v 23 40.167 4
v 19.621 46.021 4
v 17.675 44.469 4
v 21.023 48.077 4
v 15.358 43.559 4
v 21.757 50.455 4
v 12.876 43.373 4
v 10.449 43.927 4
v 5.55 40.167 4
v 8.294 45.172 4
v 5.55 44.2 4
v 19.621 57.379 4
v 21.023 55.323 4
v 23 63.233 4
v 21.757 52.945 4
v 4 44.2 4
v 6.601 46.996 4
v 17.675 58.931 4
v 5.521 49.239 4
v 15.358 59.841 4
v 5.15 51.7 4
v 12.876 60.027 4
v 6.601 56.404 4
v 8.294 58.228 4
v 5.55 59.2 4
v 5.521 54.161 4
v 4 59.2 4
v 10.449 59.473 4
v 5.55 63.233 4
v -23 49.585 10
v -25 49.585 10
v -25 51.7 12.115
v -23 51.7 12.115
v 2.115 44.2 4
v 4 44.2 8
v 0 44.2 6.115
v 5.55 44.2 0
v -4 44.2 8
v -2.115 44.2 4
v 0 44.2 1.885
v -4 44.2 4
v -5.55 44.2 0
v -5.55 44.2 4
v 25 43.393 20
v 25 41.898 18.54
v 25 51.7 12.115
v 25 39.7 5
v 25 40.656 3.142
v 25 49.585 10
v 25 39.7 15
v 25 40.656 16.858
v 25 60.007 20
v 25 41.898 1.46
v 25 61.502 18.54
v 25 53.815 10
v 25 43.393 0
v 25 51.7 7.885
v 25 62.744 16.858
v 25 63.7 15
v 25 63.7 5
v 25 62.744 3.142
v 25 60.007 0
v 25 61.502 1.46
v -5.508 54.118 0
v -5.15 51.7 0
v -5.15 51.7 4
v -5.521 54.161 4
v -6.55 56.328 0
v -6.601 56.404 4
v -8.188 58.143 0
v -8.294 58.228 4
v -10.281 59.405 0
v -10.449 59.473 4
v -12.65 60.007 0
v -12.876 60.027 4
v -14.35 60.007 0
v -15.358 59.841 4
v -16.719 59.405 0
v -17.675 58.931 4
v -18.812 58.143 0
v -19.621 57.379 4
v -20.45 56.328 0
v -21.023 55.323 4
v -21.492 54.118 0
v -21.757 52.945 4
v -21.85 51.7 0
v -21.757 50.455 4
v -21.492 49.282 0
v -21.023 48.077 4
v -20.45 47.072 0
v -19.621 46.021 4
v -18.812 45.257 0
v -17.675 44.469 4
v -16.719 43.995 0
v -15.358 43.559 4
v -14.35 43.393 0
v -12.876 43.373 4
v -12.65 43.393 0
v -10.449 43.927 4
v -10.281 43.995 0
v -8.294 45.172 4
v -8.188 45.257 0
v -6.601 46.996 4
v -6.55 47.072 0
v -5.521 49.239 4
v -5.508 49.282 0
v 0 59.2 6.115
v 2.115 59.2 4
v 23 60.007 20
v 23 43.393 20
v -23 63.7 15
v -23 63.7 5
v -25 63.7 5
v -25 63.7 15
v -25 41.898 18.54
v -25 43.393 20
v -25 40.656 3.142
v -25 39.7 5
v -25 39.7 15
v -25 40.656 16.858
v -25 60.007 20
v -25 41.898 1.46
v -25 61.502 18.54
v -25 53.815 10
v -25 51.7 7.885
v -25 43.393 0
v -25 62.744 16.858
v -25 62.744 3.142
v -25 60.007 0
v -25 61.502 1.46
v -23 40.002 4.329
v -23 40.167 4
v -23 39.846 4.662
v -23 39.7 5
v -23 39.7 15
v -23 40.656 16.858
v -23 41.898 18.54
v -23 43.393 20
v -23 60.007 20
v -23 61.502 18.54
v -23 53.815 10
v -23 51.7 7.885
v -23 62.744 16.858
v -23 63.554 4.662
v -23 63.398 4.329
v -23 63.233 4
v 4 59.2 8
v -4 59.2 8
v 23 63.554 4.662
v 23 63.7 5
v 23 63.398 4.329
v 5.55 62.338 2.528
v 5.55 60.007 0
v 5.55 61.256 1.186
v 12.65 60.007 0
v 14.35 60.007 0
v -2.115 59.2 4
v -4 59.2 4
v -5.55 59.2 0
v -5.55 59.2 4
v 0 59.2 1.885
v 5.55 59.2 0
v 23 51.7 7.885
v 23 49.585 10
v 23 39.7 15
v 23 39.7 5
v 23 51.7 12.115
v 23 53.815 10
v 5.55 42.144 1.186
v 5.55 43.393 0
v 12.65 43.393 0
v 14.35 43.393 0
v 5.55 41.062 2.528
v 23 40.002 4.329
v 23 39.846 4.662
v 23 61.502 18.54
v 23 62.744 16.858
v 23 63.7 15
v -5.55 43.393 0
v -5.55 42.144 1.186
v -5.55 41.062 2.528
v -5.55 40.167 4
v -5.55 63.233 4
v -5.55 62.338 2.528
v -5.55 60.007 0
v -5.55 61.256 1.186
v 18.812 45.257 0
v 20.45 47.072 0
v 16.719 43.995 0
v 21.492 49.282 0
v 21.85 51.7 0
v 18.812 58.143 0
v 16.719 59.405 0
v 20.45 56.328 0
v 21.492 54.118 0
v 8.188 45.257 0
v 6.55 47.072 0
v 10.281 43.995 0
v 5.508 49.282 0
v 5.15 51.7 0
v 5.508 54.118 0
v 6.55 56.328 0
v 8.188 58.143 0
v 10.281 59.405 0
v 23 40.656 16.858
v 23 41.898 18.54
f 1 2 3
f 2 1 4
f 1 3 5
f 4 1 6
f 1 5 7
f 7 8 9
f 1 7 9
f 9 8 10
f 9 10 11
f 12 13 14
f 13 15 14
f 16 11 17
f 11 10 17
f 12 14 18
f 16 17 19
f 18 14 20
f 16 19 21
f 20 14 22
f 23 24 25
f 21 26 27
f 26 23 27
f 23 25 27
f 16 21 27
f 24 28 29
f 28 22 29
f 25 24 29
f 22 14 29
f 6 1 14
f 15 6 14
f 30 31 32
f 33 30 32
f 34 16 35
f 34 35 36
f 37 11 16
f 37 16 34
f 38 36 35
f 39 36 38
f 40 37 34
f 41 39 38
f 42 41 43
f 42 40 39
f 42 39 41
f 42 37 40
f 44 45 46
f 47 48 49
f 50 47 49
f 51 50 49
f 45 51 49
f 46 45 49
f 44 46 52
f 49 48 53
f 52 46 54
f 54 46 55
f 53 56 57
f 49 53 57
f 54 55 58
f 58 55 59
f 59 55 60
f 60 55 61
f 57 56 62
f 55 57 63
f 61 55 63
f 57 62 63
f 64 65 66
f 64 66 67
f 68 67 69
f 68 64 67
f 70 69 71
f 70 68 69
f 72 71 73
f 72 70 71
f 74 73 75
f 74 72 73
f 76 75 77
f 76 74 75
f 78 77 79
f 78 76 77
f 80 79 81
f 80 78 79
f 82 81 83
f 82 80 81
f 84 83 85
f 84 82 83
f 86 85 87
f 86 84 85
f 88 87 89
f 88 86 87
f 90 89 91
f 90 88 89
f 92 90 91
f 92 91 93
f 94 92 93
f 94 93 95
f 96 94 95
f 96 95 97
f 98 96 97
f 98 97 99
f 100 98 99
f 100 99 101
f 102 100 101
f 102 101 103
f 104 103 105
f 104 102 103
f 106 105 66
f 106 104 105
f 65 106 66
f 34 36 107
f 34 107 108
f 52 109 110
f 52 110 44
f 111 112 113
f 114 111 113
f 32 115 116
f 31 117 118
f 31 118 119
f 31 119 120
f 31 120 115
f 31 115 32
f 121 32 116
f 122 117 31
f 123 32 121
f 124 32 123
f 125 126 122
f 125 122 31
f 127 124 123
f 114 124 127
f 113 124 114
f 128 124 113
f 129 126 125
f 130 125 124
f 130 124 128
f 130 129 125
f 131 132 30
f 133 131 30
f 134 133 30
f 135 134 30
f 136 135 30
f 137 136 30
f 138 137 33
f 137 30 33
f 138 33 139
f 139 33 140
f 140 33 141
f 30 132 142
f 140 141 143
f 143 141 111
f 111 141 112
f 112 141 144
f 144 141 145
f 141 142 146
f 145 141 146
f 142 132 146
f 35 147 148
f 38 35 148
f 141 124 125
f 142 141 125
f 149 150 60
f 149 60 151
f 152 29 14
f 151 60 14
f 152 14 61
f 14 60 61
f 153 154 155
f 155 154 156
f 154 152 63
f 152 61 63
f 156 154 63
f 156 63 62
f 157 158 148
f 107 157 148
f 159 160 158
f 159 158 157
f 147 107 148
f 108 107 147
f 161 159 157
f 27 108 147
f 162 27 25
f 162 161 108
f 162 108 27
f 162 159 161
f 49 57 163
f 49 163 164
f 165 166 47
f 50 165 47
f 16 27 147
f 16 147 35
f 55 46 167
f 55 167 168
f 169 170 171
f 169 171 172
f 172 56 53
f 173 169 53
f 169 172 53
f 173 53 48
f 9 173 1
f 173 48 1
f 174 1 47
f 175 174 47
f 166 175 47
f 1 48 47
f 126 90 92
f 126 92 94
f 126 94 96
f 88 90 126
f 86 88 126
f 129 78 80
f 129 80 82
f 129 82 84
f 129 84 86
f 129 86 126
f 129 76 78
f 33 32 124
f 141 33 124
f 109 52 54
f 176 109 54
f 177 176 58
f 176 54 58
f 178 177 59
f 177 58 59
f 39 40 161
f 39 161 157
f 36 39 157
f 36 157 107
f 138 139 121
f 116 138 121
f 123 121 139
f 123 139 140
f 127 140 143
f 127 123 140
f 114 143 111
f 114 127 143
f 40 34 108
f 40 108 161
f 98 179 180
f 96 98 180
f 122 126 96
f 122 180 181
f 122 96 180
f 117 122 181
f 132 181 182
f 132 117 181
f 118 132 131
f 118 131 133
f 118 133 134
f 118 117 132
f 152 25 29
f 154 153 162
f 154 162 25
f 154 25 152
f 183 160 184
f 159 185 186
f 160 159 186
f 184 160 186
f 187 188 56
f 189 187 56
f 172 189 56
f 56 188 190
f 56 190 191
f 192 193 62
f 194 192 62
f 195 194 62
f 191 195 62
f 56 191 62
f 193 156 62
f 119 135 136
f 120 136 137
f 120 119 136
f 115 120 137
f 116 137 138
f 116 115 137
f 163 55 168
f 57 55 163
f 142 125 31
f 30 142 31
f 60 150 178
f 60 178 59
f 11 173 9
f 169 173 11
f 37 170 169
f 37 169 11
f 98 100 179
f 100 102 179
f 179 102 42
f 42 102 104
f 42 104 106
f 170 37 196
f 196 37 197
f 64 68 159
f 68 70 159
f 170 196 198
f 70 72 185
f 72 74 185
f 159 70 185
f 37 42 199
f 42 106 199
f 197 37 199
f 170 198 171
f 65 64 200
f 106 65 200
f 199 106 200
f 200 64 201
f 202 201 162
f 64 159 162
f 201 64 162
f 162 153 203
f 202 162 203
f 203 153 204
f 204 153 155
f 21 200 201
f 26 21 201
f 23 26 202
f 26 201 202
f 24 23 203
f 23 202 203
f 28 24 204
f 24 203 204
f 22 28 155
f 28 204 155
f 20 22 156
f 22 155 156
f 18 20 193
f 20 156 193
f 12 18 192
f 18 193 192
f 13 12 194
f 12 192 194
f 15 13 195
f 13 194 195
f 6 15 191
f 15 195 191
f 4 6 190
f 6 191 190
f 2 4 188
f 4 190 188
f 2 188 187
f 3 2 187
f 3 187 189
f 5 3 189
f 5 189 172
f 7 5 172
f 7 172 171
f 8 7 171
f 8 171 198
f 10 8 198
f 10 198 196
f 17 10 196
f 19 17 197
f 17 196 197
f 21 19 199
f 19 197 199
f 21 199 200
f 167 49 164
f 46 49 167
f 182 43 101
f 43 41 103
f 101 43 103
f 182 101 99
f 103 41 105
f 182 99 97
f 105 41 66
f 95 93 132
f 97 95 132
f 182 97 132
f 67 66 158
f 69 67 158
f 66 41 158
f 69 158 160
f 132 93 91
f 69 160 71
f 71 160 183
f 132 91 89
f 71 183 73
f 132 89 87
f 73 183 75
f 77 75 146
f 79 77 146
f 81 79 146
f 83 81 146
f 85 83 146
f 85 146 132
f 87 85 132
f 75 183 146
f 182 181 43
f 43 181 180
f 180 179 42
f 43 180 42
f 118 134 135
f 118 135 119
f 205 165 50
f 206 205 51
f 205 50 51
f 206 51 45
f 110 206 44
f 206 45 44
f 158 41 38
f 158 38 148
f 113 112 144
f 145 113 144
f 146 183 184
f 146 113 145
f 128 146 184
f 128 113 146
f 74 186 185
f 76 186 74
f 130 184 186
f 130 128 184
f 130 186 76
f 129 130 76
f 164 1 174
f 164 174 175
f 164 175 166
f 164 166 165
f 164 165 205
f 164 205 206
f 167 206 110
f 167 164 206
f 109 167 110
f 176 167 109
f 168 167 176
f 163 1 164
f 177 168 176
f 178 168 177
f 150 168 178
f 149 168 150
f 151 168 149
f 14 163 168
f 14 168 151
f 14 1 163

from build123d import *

# Parameters (mm, degrees)
MODEL_R                  = 8.35
RESSALTO_EXTRUS_O2_DEPTH = 4
ESBO_O5_W                = 2
ESBO_O5_H                = 24
RESSALTO_EXTRUS_O3_DEPTH = 20
ESBO_O6_OUTSIDE_W        = 30.002
ESBO_O6_OUTSIDE_H        = 34.002
ESBO_O6_OUTSIDE_R        = 13
CORTE_EXTRUS_O1_DEPTH    = 26
CORTE_EXTRUS_O2_DEPTH    = 26
RESSALTO_EXTRUS_O4_DEPTH = 4
CORTE_EXTRUS_O3_DEPTH    = 20.5000001


with BuildPart() as part:
    # Model → Ressalto-extrusão2 (new body)
    with BuildSketch(Plane.XY):
        Polygon((0, 44.200000002), (0, 59.200000002), (-5.55, 59.200000002), (-5.55, 63.700000002), (-23, 63.700000002), (-23, 39.700000002), (-5.55, 39.700000002), (-5.55, 44.200000002), align=None)
        with Locations((-13.5, 51.700000002)):
            Circle(MODEL_R, mode=Mode.SUBTRACT)
    extrude(amount=RESSALTO_EXTRUS_O2_DEPTH)

    # Esboço5 → Ressalto-extrusão3 (add)
    with BuildSketch(Plane(origin=(0, 0, 0), x_dir=(-1, 0, 0), z_dir=(0, 0, -1))):
        with Locations((24, 51.700000002)):
            Rectangle(ESBO_O5_W, ESBO_O5_H)
    extrude(amount=-RESSALTO_EXTRUS_O3_DEPTH)

    # Esboço6 outside → Corte-extrusão1 (cut, through all)
    with BuildSketch(Plane.ZY.offset(25)):
        with Locations((10, 51.7)):
            Rectangle(ESBO_O6_OUTSIDE_W, ESBO_O6_OUTSIDE_H)
        with Locations((10, 51.700000002)):
            Circle(ESBO_O6_OUTSIDE_R, mode=Mode.SUBTRACT)
    extrude(amount=-CORTE_EXTRUS_O1_DEPTH, mode=Mode.SUBTRACT)

    # Esboço8 → Corte-extrusão2 (cut, through all)
    with BuildSketch(Plane.ZY.offset(25)):
        Polygon((7.885, 51.700000002), (10, 49.585000002), (12.115, 51.700000002), (10, 53.815000002), align=None)
    extrude(amount=-CORTE_EXTRUS_O2_DEPTH, mode=Mode.SUBTRACT)

    # Espelhar1: part across plane


with BuildPart() as part_1:
    add(part.part)
    add(part.part.mirror(Plane(origin=(0, 44.200000002, 4), x_dir=(0, 0, 1), z_dir=(-1, 0, 0))))

    # Esboço9 → Ressalto-extrusão4 (add)
    with BuildSketch(Plane.XY.offset(4)):
        Polygon((0, 59.200000002), (4, 59.200000002), (4, 44.200000002), (-4, 44.200000002), (-4, 59.200000002), align=None)
    extrude(amount=RESSALTO_EXTRUS_O4_DEPTH)

    # Esboço10 → Corte-extrusão3 (cut, through all)
    with BuildSketch(Plane(origin=(0, 59.200000002, 0), x_dir=(1, 0, 0), z_dir=(0, 1, 0))):
        Polygon((0, -1.885), (-2.115, -4), (0, -6.115), (2.115, -4), align=None)
    extrude(amount=-CORTE_EXTRUS_O3_DEPTH, mode=Mode.SUBTRACT)


solid = part_1.part
